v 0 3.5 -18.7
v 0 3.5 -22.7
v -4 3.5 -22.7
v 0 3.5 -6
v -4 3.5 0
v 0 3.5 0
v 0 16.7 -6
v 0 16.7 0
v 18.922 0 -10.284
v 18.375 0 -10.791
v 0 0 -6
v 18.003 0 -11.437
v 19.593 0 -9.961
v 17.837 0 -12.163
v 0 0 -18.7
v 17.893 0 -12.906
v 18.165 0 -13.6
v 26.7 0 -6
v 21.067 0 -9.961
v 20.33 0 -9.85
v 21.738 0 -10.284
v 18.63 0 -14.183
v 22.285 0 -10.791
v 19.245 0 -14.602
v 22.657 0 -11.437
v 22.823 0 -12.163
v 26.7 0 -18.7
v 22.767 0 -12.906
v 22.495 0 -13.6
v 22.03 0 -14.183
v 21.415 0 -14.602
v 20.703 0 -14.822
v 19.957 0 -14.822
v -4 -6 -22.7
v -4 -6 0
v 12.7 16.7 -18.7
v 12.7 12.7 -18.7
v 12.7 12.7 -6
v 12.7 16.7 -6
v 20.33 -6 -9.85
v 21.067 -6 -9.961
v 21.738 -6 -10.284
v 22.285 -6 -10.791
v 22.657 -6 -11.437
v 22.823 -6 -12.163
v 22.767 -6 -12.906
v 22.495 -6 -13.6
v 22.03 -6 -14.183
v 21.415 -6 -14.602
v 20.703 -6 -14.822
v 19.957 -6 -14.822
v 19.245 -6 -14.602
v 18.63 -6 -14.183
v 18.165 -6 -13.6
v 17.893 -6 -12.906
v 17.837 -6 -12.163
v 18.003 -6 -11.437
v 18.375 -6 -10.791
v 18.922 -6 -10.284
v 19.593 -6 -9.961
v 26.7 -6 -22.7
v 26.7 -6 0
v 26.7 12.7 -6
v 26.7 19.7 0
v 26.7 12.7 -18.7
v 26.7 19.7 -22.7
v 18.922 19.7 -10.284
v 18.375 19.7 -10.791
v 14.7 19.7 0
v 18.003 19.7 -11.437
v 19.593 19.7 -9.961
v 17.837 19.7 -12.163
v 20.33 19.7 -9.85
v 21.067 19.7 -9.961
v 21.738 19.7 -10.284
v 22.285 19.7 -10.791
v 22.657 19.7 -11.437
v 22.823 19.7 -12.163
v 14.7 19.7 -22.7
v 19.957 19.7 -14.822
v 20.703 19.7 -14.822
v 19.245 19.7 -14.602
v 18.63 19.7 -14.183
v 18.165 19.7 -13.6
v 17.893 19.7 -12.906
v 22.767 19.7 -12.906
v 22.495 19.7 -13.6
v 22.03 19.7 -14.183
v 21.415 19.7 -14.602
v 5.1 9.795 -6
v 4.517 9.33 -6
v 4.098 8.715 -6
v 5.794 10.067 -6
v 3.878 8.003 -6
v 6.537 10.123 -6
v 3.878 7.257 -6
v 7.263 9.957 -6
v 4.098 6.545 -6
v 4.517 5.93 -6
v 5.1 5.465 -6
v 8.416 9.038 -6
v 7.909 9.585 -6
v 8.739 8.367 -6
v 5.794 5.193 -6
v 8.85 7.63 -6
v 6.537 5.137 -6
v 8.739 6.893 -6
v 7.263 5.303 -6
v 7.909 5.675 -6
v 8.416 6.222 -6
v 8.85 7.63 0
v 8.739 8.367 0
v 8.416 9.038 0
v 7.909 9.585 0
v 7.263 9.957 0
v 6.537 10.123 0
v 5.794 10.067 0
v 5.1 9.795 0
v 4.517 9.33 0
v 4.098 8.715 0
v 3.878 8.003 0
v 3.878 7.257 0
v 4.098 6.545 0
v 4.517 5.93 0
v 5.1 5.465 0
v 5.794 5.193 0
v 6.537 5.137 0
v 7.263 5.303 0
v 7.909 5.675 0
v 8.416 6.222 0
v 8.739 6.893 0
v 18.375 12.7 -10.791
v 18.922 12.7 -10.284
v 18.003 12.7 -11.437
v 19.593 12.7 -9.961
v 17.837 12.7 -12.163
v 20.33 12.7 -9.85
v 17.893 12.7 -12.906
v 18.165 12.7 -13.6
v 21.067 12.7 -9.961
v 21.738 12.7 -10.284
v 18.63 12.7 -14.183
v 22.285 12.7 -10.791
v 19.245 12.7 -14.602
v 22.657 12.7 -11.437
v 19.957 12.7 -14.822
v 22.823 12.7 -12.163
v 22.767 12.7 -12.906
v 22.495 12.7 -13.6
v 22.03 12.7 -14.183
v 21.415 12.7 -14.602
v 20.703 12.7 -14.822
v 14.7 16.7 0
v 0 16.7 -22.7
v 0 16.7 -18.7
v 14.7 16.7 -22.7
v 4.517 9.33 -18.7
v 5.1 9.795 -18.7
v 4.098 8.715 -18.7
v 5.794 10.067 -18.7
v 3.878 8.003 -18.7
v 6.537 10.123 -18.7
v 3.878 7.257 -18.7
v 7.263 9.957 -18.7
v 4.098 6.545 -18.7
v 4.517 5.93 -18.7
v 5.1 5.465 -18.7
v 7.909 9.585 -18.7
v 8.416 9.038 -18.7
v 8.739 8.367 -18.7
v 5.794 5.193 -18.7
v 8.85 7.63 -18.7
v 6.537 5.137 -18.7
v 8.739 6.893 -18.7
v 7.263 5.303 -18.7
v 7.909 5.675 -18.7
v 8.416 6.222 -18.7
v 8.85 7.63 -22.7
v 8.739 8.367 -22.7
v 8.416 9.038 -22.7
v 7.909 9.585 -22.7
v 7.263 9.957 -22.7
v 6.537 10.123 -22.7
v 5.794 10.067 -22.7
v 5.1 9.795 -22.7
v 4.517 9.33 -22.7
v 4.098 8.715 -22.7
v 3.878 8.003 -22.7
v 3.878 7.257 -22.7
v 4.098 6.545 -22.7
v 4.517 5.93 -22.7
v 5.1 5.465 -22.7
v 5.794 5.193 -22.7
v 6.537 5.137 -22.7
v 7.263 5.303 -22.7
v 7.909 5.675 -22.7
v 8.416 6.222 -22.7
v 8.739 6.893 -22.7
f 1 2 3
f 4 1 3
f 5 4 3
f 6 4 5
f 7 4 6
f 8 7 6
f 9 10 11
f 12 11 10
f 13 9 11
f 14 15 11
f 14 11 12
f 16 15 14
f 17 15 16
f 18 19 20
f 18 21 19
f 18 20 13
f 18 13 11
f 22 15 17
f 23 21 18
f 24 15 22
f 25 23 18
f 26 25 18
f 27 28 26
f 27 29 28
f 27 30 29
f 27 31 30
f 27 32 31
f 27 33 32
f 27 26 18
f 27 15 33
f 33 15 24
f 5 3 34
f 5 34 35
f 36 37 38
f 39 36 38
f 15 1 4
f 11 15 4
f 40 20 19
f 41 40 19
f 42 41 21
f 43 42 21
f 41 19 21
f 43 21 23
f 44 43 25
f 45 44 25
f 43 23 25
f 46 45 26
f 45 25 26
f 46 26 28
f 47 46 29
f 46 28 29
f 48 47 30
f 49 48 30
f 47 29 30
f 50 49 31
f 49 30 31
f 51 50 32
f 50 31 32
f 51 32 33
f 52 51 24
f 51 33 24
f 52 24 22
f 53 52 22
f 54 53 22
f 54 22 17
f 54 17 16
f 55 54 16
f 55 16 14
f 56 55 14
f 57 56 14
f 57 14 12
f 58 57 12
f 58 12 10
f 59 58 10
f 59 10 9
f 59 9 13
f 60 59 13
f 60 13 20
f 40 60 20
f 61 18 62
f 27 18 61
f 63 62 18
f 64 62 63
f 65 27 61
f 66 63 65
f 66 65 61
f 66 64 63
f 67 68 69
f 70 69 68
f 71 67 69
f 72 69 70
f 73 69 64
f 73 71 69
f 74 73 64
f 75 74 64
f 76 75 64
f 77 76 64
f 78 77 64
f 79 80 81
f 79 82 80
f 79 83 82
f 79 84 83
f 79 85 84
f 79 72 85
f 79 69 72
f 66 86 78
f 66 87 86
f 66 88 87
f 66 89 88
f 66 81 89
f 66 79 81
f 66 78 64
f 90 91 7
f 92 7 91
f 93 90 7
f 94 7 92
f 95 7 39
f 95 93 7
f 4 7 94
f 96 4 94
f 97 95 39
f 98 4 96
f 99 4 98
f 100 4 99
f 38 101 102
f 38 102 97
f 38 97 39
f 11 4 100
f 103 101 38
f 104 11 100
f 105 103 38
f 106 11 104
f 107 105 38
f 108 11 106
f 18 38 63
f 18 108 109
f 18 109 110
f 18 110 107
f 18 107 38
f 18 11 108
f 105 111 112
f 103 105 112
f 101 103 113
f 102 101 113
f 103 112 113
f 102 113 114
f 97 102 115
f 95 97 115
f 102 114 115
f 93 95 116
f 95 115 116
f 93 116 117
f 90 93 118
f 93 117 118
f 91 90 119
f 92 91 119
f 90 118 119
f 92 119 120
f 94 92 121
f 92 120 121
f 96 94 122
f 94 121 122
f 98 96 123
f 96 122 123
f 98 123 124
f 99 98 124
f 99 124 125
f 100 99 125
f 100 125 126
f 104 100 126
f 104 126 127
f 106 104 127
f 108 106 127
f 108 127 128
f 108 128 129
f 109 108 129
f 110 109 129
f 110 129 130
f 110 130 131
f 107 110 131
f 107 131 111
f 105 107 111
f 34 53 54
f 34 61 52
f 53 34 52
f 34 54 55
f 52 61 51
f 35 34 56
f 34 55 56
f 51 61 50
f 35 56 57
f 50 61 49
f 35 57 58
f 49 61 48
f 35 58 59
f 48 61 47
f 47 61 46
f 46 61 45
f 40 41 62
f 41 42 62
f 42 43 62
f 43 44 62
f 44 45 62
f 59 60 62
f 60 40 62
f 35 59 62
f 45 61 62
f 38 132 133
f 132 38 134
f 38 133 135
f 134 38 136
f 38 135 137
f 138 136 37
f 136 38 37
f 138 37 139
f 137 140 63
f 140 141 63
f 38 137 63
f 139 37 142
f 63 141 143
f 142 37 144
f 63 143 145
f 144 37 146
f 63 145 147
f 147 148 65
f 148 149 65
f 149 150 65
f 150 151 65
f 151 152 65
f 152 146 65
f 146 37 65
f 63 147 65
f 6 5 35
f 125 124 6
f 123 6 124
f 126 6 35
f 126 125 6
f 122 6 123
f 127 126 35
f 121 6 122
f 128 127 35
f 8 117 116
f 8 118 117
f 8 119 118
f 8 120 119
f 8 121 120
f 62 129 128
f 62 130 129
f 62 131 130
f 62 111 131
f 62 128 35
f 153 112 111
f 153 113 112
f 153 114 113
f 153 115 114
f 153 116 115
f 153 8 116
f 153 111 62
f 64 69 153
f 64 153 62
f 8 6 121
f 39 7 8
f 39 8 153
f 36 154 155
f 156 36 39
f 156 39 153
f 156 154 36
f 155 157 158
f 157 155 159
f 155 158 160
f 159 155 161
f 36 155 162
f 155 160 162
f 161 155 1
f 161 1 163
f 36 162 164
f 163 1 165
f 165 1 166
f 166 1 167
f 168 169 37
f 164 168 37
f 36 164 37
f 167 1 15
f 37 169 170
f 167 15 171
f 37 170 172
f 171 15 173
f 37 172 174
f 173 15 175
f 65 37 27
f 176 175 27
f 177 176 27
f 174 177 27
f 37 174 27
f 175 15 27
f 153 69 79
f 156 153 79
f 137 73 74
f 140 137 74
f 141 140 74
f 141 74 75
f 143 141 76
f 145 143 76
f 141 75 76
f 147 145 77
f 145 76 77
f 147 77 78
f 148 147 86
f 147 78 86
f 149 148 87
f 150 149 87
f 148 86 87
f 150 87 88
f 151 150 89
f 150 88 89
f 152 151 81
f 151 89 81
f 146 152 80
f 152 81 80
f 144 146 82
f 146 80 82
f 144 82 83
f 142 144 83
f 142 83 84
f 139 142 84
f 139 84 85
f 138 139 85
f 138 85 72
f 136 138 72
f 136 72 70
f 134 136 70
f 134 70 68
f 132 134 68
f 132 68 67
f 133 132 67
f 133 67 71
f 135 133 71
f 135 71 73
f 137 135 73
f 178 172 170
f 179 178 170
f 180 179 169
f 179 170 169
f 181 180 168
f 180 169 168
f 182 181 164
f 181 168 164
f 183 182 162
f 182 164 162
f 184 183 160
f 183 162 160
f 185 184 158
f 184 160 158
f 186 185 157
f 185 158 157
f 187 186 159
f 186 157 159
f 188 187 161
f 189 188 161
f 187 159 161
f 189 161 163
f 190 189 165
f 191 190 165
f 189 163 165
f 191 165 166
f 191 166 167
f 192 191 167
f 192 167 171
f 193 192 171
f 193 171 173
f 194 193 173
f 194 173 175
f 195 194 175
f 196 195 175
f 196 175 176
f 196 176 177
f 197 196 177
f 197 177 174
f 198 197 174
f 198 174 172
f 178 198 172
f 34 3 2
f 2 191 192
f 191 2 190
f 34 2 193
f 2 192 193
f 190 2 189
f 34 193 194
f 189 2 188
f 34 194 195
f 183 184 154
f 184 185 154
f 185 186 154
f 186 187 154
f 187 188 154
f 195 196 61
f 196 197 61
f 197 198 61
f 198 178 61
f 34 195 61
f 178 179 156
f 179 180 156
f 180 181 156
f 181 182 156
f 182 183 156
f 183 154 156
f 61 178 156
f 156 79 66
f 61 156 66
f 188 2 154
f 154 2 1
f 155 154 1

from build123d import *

# Parameters (mm, degrees)
SKETCH_1_W          = 26.7
SKETCH_1_H          = 22.7
EXTRUDE_1_DEPTH     = 6
SKETCH_1_3_W        = 26.7
SKETCH_1_3_H        = 4
SKETCH_1_3_H_2      = 6
EXTRUDE_2_DEPTH     = 12.7
SKETCH_2_R          = 2.5
CUT_EXTRUDE_1_DEPTH = 38.275595233
EXTRUDE_3_DEPTH     = 4
SKETCH_4_R          = 2.5
CUT_EXTRUDE_2_DEPTH = 42.754879954
SKETCH_6_W          = 22.7
SKETCH_6_H          = 9.5
EXTRUDE_4_DEPTH     = 4
EXTRUDE_START       = 3
SKETCH_7_W          = 12
SKETCH_7_H          = 22.7
SKETCH_7_R          = 2.5
EXTRUDE_5_DEPTH     = 3


with BuildPart() as part:
    # 草图1 → 凸台-拉伸1 (new body)
    with BuildSketch(Plane(origin=(0, 0, 0), x_dir=(1, 0, 0), z_dir=(0, 1, 0))):
        with Locations((13.35, 11.35)):
            Rectangle(SKETCH_1_W, SKETCH_1_H)
    extrude(amount=-EXTRUDE_1_DEPTH)

    # 草图1<3> → 凸台-拉伸2 (add)
    with BuildSketch(Plane(origin=(0, 0, 0), x_dir=(1, 0, 0), z_dir=(0, 1, 0))):
        with Locations((13.35, 20.7)):
            Rectangle(SKETCH_1_3_W, SKETCH_1_3_H)
        with Locations((13.35, 3)):
            Rectangle(SKETCH_1_3_W, SKETCH_1_3_H_2)
    extrude(amount=EXTRUDE_2_DEPTH)

    # 草图2 → 切除-拉伸1 (cut, through all)
    with BuildSketch(Plane.XY):
        with Locations((6.35, 7.63)):
            Circle(SKETCH_2_R)
    extrude(amount=-CUT_EXTRUDE_1_DEPTH, mode=Mode.SUBTRACT)

    # 草图3 → 凸台-拉伸3 (add)
    with BuildSketch(Plane(origin=(0, 12.7, 0), x_dir=(1, 0, 0), z_dir=(0, 1, 0))):
        Polygon((0, 22.7), (0, 18.7), (12.7, 18.7), (12.7, 6), (0, 6), (0, 0), (26.7, 0), (26.7, 22.7), align=None)
    extrude(amount=EXTRUDE_3_DEPTH)

    # 草图4 → 切除-拉伸2 (cut, through all)
    with BuildSketch(Plane(origin=(0, 16.7, 0), x_dir=(1, 0, 0), z_dir=(0, 1, 0))):
        with Locations((20.33, 12.35)):
            Circle(SKETCH_4_R)
    extrude(amount=-CUT_EXTRUDE_2_DEPTH, mode=Mode.SUBTRACT)

    # 草图6 → 凸台-拉伸4 (add)
    with BuildSketch(Plane.ZY):
        with Locations((-11.35, -1.25)):
            Rectangle(SKETCH_6_W, SKETCH_6_H)
    extrude(amount=EXTRUDE_4_DEPTH)

    # 草图7 → 凸台-拉伸5 (add)
    with BuildSketch(Plane(origin=(0, 16.7, 0), x_dir=(1, 0, 0), z_dir=(0, 1, 0)).offset(EXTRUDE_START)):
        with Locations((20.7, 11.35)):
            Rectangle(SKETCH_7_W, SKETCH_7_H)
        with Locations((20.33, 12.35)):
            Circle(SKETCH_7_R, mode=Mode.SUBTRACT)
    extrude(amount=-EXTRUDE_5_DEPTH)


solid = part.part
